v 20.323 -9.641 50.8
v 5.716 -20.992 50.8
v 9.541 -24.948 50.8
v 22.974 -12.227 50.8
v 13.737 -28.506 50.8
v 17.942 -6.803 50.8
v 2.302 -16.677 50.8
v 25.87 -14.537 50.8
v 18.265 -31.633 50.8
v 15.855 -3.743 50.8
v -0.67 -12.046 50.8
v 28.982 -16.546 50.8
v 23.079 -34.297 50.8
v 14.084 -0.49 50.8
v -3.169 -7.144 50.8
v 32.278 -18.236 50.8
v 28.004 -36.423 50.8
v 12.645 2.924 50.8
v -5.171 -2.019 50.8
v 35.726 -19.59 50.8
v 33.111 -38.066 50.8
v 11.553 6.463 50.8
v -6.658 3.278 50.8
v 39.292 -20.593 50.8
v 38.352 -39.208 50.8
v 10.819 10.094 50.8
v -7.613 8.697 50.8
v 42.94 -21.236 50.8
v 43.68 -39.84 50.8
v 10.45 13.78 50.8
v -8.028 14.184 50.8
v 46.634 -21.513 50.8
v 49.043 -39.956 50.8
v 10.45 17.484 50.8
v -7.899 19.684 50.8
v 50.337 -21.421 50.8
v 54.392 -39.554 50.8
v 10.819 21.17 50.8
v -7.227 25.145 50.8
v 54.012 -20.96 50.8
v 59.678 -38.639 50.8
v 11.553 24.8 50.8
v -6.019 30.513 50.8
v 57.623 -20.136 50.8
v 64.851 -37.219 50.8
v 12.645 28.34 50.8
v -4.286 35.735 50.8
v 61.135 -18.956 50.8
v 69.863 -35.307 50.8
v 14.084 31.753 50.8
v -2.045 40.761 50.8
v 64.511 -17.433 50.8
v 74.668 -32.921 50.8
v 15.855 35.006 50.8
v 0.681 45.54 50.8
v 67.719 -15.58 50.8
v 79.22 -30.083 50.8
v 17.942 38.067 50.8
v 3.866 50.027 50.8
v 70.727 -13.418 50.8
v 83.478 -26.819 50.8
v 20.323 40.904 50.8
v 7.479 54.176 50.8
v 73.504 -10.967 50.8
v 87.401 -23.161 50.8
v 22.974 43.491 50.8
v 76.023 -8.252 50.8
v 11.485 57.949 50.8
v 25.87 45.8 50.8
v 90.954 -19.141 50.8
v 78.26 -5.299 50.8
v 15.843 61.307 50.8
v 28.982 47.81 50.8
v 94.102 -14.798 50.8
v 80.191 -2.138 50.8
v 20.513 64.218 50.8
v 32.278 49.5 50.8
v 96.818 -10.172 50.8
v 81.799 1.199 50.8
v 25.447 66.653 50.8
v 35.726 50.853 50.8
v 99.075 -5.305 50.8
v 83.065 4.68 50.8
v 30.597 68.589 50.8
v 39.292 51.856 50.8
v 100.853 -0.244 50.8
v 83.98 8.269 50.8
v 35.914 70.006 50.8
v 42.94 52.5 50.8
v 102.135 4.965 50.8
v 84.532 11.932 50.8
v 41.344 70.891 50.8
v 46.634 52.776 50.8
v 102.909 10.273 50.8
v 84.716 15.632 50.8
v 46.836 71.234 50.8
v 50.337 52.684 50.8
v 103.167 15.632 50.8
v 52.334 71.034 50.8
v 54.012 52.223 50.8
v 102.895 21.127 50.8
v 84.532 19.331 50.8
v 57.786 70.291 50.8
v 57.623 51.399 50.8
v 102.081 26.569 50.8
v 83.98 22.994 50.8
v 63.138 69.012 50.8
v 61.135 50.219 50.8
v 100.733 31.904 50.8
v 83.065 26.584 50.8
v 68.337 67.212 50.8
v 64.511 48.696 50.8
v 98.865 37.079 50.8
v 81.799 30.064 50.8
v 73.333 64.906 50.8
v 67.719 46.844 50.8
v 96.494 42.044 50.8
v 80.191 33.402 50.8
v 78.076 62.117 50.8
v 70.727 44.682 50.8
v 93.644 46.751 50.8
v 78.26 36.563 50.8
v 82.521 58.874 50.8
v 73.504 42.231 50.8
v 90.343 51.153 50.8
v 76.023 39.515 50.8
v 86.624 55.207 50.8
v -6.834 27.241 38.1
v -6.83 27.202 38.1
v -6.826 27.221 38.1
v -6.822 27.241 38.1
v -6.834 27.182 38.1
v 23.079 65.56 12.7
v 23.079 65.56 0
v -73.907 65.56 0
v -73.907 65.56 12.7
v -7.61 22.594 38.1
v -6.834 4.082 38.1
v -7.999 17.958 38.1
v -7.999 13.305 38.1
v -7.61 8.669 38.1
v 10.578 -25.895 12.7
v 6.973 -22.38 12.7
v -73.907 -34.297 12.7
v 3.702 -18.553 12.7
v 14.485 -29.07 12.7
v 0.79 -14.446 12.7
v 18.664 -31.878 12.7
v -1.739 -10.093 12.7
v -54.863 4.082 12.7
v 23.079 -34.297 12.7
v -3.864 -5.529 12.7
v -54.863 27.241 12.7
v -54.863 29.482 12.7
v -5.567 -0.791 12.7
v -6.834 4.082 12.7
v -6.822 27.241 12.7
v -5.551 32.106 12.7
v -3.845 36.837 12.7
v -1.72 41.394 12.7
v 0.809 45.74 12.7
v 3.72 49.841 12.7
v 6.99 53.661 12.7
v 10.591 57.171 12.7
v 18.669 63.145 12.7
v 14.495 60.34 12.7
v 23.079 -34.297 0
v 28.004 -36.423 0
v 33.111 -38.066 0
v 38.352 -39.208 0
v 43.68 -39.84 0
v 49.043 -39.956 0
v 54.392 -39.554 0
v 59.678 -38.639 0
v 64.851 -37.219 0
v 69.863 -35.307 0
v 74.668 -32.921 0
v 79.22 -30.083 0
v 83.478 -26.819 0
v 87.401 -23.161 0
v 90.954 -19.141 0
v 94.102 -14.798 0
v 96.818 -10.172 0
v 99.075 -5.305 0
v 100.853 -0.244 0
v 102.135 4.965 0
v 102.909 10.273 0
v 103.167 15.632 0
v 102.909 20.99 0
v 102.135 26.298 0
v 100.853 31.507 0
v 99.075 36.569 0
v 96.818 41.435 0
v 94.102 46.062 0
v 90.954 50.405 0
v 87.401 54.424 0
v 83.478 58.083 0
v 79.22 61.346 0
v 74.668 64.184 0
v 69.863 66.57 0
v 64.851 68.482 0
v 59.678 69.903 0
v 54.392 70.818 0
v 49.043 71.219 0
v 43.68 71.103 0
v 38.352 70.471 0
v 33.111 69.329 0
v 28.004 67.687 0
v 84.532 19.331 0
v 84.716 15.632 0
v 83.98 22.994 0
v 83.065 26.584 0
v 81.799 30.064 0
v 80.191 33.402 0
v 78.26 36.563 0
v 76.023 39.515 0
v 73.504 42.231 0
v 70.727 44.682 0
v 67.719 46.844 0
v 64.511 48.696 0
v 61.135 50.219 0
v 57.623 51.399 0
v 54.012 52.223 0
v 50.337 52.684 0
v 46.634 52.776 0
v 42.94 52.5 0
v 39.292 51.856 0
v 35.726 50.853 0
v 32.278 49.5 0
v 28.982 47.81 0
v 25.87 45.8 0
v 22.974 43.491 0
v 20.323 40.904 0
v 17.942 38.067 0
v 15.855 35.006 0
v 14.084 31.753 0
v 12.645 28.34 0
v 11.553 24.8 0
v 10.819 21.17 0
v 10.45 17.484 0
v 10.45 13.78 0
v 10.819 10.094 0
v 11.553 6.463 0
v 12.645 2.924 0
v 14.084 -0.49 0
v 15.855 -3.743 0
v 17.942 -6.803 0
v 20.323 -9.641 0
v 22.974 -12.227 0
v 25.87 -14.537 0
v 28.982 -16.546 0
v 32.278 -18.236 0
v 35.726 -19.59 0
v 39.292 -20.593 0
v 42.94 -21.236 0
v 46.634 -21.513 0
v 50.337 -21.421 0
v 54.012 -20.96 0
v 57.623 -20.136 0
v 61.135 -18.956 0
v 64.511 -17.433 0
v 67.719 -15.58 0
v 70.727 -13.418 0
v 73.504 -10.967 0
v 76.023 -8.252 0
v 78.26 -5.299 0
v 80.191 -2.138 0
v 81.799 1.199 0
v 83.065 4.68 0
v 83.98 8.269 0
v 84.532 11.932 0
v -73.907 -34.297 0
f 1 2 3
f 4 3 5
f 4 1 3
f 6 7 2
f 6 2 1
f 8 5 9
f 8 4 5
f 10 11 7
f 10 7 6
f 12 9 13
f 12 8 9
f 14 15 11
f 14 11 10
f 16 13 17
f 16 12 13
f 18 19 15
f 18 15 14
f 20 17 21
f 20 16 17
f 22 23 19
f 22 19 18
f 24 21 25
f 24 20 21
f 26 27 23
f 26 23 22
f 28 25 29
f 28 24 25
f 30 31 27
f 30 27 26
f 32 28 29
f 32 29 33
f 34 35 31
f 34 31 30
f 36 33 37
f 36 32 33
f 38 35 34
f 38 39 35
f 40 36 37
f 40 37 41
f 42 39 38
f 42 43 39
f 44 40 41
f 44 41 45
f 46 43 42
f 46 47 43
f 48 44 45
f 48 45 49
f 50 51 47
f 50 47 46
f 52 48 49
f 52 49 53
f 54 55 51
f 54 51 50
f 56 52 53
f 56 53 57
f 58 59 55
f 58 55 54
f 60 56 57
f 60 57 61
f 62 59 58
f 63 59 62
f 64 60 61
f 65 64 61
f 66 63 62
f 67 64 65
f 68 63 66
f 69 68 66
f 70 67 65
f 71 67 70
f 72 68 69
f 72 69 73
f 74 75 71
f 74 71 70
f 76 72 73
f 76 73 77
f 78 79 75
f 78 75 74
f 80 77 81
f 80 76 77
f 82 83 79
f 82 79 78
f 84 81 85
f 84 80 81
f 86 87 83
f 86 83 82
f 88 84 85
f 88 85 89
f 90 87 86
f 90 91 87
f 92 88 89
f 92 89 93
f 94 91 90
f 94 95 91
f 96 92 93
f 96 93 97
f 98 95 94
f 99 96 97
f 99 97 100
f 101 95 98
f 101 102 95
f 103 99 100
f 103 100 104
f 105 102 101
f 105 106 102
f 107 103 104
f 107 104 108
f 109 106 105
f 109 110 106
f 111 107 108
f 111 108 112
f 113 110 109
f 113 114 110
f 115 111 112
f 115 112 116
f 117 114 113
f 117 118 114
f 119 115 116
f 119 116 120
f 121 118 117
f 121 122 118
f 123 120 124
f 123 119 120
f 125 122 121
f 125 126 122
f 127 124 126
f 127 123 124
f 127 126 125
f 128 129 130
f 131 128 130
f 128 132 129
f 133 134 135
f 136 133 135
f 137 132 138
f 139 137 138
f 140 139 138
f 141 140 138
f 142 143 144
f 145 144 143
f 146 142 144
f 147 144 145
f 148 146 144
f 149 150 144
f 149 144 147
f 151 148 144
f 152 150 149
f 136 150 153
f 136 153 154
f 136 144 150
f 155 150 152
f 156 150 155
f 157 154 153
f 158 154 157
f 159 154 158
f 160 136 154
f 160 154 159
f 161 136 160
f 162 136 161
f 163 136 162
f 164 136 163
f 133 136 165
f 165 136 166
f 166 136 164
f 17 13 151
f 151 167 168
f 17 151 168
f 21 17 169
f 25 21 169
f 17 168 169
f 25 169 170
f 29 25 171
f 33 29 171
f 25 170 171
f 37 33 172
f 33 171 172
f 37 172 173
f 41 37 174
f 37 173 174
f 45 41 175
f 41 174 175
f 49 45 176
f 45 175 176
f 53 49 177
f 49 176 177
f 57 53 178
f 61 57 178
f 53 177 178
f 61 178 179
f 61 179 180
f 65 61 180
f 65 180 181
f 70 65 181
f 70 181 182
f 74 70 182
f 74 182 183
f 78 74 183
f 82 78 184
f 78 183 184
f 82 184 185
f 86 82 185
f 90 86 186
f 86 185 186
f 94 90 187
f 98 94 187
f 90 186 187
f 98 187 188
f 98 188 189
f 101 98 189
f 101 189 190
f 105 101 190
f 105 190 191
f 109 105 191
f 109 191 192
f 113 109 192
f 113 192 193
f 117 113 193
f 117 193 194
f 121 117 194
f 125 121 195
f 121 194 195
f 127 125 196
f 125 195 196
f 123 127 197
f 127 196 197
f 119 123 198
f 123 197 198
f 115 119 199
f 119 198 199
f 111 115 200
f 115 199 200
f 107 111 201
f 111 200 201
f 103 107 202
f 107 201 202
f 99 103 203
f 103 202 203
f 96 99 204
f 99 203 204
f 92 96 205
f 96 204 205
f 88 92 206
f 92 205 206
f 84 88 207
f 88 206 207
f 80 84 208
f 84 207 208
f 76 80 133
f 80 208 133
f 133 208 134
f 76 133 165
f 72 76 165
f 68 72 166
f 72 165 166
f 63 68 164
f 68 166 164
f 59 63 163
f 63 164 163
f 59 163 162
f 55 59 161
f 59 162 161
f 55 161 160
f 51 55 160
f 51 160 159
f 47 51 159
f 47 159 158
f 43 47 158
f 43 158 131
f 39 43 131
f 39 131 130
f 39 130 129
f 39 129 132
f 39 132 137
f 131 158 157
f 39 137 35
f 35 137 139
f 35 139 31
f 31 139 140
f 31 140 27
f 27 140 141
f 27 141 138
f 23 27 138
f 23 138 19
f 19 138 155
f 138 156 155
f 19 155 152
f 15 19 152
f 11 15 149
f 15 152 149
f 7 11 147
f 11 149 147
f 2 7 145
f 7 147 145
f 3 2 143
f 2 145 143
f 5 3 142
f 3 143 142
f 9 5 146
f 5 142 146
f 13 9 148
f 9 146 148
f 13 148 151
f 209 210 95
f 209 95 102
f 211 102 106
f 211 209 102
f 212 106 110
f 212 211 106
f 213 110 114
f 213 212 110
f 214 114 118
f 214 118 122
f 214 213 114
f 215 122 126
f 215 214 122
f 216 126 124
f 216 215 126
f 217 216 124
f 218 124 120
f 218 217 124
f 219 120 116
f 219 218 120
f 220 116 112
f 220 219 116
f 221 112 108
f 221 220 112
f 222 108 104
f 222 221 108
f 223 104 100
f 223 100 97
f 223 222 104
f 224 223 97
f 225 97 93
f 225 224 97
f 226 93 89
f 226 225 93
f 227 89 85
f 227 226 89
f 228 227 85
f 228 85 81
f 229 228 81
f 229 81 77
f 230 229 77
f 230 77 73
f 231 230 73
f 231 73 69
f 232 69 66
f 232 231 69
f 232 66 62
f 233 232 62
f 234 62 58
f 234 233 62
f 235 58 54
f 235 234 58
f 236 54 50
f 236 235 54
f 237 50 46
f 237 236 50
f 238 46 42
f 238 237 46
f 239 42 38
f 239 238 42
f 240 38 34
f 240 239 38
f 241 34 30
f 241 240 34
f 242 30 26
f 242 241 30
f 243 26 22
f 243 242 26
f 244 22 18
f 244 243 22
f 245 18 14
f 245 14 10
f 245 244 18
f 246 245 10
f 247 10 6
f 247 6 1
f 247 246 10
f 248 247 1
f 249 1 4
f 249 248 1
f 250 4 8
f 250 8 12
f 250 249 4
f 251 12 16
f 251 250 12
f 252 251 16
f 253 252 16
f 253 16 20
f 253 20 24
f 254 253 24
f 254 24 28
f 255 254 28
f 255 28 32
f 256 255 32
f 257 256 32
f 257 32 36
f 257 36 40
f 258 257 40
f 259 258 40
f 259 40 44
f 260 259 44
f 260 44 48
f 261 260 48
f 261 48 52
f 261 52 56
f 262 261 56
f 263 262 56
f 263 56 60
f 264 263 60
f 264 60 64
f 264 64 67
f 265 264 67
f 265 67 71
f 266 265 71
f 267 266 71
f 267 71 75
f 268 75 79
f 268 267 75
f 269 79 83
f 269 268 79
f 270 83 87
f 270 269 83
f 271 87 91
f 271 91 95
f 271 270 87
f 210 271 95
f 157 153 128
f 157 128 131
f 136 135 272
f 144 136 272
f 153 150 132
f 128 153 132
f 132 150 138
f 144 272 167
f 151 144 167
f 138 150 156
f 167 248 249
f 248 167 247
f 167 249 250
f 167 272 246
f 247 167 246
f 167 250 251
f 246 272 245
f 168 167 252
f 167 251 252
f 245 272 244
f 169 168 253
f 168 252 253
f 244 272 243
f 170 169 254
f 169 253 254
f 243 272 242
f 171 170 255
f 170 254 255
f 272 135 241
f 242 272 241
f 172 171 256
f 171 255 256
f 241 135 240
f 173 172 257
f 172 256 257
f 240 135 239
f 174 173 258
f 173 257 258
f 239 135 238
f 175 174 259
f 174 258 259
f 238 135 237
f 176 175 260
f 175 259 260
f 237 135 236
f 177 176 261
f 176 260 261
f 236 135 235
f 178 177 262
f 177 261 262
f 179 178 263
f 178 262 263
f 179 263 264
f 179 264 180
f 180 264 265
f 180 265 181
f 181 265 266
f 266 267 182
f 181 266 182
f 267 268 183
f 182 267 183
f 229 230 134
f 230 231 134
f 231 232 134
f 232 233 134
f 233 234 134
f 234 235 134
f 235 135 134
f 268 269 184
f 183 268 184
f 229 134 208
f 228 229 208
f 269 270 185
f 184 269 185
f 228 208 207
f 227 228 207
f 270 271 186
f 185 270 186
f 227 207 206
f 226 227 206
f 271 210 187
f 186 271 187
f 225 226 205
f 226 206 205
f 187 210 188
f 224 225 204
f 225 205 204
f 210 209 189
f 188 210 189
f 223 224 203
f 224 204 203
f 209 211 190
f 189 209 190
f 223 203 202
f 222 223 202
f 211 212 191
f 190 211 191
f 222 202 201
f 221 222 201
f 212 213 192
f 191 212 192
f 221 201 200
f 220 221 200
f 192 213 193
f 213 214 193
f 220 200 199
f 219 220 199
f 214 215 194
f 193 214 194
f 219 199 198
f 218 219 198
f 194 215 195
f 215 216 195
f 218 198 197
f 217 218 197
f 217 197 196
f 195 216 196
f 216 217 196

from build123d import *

# Parameters (mm, degrees)
F1_DEPTH = 12.7
F0_R     = 37.1561750652
F2_DEPTH = 50.8
F3_W     = 62.4604108743
F3_H     = 23.1594787911
F4_DEPTH = 38.1
F6_DEPTH = 25.4


with BuildPart() as f1:
    # F0 (on Top) → F1 (new body)
    with BuildSketch(Plane.XY):
        with BuildLine():
            Line((23.0791009963, 65.5601993203), (-73.9074721932, 65.5601993203))
            Line((-73.9074721932, 65.5601993203), (-73.9074721932, -34.29678455))
            Line((-73.9074721932, -34.29678455), (23.0791009963, -34.29678455))
            ThreePointArc((23.0791009963, -34.29678455), (-8.0472334197, 15.6317073852), (23.0791009963, 65.5601993203))
        make_face()
    extrude(amount=F1_DEPTH)

    # F0 (on Top) → F2 (join)
    with BuildSketch(Plane.XY):
        with BuildLine():
            ThreePointArc((103.1673720276, 15.6317073852), (76.978188725, 62.8201208563), (23.0791009963, 65.5601993203))
            ThreePointArc((23.0791009963, 65.5601993203), (-8.0472334197, 15.6317073852), (23.0791009963, -34.29678455))
            ThreePointArc((23.0791009963, -34.29678455), (76.978188725, -31.556706086), (103.1673720276, 15.6317073852))
        make_face()
        with Locations((47.5600693039, 15.6317073852)):
            Circle(F0_R, mode=Mode.SUBTRACT)
    extrude(amount=F2_DEPTH)

    # F3 (on Top) → F4 (join)
    with BuildSketch(Plane.XY):
        with Locations((-23.632629076, 15.6614030711)):
            Rectangle(F3_W, F3_H)
    extrude(amount=F4_DEPTH)

    # F5 (on face) → F6 (cut)
    with BuildSketch(Plane.XZ.offset(-4.0816636756)):
        Polygon((-54.8628345132, 38.1), (-54.8628345132, 12.7), (-6.8344948225, 38.1), align=None)
    extrude(amount=-F6_DEPTH, mode=Mode.SUBTRACT)


solid = f1.part
